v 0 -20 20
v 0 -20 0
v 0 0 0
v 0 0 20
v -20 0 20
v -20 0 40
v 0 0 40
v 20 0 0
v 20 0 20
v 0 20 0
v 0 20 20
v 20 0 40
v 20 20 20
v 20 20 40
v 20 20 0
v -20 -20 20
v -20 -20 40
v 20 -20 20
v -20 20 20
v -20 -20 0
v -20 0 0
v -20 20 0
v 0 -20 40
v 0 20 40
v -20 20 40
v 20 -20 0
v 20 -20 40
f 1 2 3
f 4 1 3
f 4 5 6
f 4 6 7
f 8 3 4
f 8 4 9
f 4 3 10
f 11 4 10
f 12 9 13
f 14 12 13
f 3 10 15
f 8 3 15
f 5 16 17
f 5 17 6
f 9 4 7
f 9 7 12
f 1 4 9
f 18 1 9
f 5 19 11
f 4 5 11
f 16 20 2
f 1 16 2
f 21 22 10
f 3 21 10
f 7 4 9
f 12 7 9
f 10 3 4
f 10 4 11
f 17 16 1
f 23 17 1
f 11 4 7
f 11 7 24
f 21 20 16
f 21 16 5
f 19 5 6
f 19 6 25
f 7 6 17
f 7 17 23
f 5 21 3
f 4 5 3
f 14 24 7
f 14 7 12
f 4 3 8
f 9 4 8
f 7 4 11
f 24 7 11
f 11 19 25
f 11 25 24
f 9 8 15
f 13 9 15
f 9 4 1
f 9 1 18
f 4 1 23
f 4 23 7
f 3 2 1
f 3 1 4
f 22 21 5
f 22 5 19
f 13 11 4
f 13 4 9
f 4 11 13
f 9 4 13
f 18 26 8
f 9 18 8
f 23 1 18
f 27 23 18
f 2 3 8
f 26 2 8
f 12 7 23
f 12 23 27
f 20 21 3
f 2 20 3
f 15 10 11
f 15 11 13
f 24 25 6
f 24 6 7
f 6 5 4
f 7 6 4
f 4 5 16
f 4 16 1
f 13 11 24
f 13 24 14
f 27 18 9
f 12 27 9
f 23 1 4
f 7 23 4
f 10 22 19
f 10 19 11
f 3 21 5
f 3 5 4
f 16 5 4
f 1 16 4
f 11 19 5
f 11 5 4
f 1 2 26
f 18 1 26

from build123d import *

# Parameters (mm, degrees)
F0_W      = 20
F0_H      = 20
F1_DEPTH  = 20
F2_W      = 20
F2_H      = 20
F3_DEPTH  = 20
F4_W      = 20
F4_H      = 20
F5_DEPTH  = 20
F3_FACE_W = 20
F3_FACE_H = 20
F6_DEPTH  = 20


with BuildPart() as f1:
    # F0 (on Top) → F1 (new body)
    with BuildSketch(Plane.XY):
        with Locations((-10, 10)):
            Rectangle(F0_W, F0_H)
        with Locations((10, -10)):
            Rectangle(F0_W, F0_H)
    extrude(amount=F1_DEPTH)


with BuildPart() as f3:
    # F2 (on Top) → F3 (new body)
    with BuildSketch(Plane.XY):
        with Locations((10, 10)):
            Rectangle(F2_W, F2_H)
        with Locations((-10, -10)):
            Rectangle(F2_W, F2_H)
    extrude(amount=F3_DEPTH)


with BuildPart() as f5:
    # F4 (on face) → F5 (new body)
    with BuildSketch(Plane.XY.offset(20)):
        with Locations((-10, 10)):
            Rectangle(F4_W, F4_H)
        with Locations((10, -10)):
            Rectangle(F4_W, F4_H)
    extrude(amount=F5_DEPTH)


with BuildPart() as f6:
    # F3_face (on face) → F6 (new body)
    with BuildSketch(Plane(origin=(-10, -10, 20), x_dir=(1, 0, 0), z_dir=(0, 0, 1))):
        Rectangle(F3_FACE_W, F3_FACE_H)
        with Locations((20, 20)):
            Rectangle(F3_FACE_W, F3_FACE_H)
    extrude(amount=F6_DEPTH)


solid = Compound([f1.part, f3.part, f5.part, f6.part])
